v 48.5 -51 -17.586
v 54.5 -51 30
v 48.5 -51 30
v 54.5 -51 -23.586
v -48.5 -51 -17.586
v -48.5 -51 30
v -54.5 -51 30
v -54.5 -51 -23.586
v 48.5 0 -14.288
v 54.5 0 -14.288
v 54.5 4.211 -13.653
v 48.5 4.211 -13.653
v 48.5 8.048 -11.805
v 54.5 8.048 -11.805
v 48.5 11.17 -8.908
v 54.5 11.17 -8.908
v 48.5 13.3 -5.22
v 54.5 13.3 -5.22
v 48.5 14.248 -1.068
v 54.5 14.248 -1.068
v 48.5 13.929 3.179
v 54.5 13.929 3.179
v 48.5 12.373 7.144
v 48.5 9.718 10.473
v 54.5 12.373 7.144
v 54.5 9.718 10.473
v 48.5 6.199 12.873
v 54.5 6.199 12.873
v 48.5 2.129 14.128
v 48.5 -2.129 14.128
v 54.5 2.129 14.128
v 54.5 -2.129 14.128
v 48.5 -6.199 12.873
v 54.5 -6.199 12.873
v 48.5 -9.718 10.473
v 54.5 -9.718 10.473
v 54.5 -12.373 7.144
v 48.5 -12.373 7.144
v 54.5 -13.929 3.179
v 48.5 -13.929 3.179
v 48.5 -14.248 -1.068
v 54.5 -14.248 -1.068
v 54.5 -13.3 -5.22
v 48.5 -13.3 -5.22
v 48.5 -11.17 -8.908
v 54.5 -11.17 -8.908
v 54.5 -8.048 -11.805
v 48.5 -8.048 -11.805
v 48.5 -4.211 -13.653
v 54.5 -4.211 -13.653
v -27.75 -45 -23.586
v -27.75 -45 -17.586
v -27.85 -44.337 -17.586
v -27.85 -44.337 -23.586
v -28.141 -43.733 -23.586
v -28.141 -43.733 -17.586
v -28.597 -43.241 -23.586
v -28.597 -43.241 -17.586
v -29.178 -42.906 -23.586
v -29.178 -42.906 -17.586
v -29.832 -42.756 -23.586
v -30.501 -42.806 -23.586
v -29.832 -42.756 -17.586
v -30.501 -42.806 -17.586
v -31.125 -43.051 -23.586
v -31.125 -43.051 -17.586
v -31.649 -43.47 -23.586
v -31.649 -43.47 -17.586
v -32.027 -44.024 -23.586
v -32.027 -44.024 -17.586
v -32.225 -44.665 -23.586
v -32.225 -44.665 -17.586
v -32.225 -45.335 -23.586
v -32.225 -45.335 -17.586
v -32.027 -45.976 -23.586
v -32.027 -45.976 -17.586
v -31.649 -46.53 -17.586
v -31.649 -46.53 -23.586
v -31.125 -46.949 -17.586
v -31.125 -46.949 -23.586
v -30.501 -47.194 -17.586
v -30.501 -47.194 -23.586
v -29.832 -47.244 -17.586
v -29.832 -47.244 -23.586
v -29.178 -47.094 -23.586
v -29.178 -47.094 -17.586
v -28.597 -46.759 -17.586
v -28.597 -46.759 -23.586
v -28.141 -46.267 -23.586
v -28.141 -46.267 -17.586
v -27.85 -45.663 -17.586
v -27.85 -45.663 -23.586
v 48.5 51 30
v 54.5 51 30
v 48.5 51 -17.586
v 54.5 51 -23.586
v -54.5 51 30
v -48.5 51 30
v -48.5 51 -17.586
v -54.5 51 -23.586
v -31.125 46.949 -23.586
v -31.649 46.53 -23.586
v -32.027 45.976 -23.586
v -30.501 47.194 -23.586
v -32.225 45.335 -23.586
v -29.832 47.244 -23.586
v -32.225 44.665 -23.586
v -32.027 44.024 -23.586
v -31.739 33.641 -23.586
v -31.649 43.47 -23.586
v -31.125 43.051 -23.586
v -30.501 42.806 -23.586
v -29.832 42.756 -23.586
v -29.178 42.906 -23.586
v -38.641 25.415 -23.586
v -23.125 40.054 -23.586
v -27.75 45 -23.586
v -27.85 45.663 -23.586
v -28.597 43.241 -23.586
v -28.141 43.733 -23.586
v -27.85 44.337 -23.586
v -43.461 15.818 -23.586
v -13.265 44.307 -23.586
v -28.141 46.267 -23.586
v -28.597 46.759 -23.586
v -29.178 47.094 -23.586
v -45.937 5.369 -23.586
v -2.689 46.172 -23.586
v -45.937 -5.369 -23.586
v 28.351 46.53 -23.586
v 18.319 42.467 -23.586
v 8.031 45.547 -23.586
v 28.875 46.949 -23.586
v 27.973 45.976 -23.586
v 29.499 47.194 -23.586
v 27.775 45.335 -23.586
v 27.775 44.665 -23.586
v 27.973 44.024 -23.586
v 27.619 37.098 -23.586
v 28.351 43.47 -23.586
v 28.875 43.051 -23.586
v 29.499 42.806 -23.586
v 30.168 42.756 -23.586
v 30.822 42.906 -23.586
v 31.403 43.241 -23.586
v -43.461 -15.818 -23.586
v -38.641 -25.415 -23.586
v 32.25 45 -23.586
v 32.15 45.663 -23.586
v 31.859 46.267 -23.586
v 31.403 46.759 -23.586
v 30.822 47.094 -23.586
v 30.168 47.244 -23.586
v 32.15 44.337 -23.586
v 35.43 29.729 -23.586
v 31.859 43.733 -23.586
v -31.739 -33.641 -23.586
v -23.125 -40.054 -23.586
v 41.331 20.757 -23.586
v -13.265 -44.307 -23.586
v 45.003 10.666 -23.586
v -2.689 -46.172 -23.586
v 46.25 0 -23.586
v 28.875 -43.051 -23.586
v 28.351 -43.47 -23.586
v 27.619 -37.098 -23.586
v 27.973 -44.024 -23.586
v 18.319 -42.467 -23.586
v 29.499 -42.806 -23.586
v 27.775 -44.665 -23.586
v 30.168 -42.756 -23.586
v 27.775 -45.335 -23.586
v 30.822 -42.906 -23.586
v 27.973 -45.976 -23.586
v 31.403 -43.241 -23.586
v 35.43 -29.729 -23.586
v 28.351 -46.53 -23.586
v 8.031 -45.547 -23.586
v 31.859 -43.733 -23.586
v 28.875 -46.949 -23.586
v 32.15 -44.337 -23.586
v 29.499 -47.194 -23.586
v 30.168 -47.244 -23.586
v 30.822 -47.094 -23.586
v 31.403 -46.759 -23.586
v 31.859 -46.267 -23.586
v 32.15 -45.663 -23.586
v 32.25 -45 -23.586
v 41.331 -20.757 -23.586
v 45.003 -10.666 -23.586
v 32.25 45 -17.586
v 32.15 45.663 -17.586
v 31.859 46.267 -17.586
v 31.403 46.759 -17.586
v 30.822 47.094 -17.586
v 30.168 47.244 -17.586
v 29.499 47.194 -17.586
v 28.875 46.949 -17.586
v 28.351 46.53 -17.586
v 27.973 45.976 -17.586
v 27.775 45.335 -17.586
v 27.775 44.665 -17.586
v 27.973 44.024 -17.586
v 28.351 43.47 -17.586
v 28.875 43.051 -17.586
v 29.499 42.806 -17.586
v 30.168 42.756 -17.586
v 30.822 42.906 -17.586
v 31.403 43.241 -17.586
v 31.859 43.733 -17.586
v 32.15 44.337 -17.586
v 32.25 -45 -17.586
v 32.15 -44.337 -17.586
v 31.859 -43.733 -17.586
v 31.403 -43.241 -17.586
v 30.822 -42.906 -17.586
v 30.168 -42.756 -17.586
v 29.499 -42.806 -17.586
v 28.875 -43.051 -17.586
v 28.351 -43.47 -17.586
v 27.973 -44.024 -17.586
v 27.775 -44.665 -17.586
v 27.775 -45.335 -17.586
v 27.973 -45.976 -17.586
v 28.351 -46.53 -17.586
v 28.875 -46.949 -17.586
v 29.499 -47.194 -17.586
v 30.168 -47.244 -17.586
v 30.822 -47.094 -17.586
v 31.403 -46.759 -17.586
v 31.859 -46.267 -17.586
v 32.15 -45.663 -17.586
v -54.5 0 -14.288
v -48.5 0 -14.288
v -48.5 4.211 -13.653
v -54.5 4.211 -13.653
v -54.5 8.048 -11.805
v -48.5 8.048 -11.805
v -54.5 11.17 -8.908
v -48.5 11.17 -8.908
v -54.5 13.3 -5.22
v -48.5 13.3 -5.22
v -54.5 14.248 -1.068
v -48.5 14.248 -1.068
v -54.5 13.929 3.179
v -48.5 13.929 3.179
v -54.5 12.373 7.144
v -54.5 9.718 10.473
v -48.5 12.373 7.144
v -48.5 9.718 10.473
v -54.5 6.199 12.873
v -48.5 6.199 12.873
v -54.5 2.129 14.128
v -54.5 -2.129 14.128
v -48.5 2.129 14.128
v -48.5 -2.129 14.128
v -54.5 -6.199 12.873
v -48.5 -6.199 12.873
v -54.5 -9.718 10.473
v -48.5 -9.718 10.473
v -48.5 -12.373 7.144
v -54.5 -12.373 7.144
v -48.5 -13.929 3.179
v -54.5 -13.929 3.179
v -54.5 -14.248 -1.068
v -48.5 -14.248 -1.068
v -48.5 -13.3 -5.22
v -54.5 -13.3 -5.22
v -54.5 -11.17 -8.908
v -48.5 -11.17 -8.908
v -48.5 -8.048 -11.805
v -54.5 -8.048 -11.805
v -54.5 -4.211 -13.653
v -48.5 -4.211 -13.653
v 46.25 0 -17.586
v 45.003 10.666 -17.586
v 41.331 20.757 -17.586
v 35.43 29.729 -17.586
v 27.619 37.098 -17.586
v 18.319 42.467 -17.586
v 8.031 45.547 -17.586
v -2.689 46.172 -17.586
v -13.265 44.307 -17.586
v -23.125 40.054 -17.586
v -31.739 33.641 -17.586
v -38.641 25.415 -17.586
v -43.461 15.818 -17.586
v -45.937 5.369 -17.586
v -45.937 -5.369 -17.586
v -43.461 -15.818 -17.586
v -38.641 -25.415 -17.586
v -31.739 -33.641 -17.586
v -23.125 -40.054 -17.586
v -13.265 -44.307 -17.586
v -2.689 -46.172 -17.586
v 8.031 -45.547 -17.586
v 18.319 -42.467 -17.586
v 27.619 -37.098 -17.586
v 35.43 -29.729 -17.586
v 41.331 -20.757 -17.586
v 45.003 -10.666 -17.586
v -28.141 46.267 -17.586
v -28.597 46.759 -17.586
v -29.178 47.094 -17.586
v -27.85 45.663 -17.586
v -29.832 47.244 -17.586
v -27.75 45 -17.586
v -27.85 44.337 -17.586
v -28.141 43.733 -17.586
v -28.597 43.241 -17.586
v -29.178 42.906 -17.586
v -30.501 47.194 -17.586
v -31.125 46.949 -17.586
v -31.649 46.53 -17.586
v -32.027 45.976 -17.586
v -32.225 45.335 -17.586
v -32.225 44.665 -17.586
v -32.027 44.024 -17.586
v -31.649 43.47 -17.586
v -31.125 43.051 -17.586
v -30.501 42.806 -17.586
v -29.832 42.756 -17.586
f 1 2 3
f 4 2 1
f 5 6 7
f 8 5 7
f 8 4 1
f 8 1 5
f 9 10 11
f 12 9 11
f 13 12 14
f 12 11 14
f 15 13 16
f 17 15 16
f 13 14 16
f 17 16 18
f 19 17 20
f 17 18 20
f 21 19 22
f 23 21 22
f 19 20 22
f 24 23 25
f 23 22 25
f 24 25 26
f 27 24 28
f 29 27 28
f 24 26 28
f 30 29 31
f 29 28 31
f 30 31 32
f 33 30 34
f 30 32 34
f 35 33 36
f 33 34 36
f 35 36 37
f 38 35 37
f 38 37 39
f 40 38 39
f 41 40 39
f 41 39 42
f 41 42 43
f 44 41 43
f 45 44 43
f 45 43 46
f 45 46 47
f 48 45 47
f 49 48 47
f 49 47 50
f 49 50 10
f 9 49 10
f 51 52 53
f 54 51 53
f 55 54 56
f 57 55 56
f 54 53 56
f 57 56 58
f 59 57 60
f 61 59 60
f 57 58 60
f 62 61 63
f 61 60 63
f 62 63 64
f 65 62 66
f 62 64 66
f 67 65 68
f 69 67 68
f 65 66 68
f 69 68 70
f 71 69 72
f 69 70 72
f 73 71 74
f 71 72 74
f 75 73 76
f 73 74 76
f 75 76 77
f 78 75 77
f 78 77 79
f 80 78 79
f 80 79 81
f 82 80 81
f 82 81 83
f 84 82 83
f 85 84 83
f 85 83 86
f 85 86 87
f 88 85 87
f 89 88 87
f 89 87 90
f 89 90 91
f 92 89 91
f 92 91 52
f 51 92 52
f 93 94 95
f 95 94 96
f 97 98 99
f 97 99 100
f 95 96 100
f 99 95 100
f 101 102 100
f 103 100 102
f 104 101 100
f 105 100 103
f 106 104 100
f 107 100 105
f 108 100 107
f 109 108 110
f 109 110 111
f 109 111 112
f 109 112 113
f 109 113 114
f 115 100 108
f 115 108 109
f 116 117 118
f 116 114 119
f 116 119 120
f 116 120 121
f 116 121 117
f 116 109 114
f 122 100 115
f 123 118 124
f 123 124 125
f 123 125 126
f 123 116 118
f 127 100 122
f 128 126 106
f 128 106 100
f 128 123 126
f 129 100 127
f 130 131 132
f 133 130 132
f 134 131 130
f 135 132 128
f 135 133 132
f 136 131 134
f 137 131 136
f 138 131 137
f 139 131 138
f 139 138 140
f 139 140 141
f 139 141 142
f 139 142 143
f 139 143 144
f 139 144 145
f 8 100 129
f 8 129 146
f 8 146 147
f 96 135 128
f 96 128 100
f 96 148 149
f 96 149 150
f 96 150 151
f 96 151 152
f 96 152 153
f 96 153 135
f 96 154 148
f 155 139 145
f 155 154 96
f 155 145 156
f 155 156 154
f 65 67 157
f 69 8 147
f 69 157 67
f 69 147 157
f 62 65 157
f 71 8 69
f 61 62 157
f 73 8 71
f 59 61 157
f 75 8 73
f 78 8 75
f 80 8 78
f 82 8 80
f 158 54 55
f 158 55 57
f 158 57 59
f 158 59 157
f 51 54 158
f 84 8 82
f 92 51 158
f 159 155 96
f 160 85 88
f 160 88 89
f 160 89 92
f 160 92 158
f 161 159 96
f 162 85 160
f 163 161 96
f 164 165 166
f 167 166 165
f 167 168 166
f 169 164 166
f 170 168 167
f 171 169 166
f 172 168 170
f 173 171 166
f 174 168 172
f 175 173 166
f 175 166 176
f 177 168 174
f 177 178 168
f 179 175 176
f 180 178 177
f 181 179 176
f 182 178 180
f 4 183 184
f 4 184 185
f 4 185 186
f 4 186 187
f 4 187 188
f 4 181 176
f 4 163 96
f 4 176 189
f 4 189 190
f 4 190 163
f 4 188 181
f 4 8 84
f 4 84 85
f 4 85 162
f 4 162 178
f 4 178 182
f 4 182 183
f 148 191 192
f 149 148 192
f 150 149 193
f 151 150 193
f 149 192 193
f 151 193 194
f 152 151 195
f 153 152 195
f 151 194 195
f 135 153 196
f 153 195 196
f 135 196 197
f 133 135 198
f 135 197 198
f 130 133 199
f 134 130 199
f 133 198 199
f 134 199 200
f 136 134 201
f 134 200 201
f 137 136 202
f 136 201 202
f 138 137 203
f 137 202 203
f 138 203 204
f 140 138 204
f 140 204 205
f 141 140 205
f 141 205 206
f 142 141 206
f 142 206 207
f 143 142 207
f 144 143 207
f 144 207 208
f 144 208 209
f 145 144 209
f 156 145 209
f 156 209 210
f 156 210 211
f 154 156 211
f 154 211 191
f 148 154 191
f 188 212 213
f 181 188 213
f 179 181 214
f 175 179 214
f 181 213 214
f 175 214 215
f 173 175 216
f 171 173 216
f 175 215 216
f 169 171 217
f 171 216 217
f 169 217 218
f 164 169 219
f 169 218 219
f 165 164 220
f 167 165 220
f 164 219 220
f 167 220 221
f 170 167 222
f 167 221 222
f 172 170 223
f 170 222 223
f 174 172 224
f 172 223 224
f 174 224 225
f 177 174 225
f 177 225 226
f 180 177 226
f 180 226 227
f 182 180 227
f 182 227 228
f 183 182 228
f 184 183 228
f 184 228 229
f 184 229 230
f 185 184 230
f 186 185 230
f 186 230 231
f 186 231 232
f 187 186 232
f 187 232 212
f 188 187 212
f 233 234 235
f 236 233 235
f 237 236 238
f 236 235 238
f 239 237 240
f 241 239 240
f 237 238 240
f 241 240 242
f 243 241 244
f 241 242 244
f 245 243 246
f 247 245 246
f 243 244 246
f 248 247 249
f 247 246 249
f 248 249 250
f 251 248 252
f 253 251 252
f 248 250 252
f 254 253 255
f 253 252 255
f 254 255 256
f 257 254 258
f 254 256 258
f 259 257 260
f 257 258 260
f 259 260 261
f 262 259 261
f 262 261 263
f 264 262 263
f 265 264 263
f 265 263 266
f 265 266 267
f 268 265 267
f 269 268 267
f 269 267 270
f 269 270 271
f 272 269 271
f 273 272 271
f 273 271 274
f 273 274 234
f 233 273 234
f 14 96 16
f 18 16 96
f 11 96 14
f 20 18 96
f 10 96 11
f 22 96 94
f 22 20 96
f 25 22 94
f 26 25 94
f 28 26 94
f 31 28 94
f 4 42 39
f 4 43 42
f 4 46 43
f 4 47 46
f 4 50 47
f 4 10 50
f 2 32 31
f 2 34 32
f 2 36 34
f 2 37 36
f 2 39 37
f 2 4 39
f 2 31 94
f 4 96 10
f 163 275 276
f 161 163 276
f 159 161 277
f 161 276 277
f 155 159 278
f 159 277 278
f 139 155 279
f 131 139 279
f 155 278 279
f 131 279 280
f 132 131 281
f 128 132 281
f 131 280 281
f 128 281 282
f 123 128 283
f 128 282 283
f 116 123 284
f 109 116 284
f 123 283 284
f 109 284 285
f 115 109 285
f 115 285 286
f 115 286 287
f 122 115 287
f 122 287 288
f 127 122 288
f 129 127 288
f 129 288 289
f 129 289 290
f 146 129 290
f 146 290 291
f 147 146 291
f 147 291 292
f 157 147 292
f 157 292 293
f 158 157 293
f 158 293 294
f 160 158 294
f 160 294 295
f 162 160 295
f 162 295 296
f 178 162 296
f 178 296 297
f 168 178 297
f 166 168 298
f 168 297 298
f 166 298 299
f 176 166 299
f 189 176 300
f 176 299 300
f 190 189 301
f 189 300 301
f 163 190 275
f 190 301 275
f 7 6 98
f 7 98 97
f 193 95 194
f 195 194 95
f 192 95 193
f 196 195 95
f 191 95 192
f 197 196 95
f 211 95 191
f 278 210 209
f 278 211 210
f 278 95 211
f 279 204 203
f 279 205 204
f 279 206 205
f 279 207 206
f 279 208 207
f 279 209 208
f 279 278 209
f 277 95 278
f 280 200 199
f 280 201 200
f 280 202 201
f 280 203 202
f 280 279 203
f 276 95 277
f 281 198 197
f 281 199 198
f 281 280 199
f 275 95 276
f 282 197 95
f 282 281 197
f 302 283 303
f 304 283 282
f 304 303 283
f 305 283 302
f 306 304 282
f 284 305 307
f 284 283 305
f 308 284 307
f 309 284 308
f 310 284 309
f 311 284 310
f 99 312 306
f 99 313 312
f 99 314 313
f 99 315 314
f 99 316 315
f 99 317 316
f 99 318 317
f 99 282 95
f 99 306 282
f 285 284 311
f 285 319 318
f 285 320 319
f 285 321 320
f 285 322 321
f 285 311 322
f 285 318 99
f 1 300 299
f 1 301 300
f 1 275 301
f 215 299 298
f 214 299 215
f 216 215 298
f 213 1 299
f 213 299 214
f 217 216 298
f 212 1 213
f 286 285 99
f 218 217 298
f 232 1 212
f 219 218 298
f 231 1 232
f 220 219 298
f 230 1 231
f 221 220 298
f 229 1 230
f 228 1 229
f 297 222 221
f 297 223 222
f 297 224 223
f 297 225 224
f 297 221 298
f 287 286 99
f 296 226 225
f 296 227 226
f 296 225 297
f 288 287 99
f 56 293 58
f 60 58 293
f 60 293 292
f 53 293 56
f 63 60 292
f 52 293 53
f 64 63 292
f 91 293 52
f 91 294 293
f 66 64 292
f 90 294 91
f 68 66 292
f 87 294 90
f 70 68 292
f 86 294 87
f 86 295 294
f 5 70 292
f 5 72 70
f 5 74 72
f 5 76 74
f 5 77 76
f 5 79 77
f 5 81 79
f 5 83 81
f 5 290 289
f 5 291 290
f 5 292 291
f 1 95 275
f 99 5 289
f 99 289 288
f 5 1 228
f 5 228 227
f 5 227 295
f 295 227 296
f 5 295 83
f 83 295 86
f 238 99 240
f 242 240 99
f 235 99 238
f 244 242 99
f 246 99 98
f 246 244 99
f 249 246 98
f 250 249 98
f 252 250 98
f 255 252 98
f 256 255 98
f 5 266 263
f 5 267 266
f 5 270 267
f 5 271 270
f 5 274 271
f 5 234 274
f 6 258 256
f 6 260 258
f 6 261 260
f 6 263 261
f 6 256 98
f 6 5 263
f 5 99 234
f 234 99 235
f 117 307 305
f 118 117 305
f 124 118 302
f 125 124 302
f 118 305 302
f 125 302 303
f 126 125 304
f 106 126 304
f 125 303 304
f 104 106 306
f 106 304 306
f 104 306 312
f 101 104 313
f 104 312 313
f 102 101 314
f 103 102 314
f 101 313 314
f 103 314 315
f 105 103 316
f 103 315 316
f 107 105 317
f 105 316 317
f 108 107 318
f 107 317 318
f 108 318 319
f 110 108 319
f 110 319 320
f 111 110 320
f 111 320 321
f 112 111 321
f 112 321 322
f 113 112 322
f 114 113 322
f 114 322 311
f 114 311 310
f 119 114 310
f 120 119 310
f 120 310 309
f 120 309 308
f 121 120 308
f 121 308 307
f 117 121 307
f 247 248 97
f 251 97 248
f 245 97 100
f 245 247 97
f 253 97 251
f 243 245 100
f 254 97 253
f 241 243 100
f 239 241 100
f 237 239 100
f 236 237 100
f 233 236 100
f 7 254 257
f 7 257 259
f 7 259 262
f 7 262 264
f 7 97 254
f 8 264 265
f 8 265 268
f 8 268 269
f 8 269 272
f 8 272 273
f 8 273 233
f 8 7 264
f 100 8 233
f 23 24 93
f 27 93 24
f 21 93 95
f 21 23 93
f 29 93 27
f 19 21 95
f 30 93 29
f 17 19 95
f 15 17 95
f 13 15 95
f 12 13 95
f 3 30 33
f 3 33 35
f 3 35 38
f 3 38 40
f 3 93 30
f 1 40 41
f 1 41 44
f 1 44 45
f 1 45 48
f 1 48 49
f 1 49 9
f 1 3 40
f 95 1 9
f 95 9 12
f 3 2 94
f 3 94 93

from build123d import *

# Parameters (mm, degrees)
BOSS_EXTRUDE2_DEPTH      = 51
BOSS_EXTRUDE2_DEPTH_BACK = 51
SKETCH4_R                = 46.25
SKETCH4_R_2              = 2.25
CUT_EXTRUDE1_DEPTH       = 89.519630491
SKETCH5_R                = 14.2875
CUT_EXTRUDE2_DEPTH       = 125.024191189


with BuildPart() as part:
    # Sketch3 → Boss-Extrude2 (new, two sides: drawn at the far end of the back side and taken through both)
    with BuildSketch(Plane(origin=(0, 0, 0), x_dir=(1, 0, 0), z_dir=(0, 1, 0)).offset(-BOSS_EXTRUDE2_DEPTH_BACK)):
        Polygon((-48.5, -30), (-54.5, -30), (-54.5, 23.5865), (54.5, 23.5865), (54.5, -30), (48.5, -30), (48.5, 17.5865), (-48.5, 17.5865), align=None)
    extrude(amount=BOSS_EXTRUDE2_DEPTH + BOSS_EXTRUDE2_DEPTH_BACK)

    # Sketch4 → Cut-Extrude1 (cut, through all)
    with BuildSketch(Plane.XY.offset(-17.5865)):
        Circle(SKETCH4_R)
        with Locations((-30, 45)):
            Circle(SKETCH4_R_2)
        with Locations((30, 45)):
            Circle(SKETCH4_R_2)
        with Locations((30, -45)):
            Circle(SKETCH4_R_2)
        with Locations((-30, -45)):
            Circle(SKETCH4_R_2)
    extrude(amount=-CUT_EXTRUDE1_DEPTH, mode=Mode.SUBTRACT)

    # Sketch5 → Cut-Extrude2 (cut, through all)
    with BuildSketch(Plane(origin=(54.5, 0, 0), x_dir=(0, 0, -1), z_dir=(1, 0, 0))):
        Circle(SKETCH5_R)
    extrude(amount=-CUT_EXTRUDE2_DEPTH, mode=Mode.SUBTRACT)


solid = part.part
